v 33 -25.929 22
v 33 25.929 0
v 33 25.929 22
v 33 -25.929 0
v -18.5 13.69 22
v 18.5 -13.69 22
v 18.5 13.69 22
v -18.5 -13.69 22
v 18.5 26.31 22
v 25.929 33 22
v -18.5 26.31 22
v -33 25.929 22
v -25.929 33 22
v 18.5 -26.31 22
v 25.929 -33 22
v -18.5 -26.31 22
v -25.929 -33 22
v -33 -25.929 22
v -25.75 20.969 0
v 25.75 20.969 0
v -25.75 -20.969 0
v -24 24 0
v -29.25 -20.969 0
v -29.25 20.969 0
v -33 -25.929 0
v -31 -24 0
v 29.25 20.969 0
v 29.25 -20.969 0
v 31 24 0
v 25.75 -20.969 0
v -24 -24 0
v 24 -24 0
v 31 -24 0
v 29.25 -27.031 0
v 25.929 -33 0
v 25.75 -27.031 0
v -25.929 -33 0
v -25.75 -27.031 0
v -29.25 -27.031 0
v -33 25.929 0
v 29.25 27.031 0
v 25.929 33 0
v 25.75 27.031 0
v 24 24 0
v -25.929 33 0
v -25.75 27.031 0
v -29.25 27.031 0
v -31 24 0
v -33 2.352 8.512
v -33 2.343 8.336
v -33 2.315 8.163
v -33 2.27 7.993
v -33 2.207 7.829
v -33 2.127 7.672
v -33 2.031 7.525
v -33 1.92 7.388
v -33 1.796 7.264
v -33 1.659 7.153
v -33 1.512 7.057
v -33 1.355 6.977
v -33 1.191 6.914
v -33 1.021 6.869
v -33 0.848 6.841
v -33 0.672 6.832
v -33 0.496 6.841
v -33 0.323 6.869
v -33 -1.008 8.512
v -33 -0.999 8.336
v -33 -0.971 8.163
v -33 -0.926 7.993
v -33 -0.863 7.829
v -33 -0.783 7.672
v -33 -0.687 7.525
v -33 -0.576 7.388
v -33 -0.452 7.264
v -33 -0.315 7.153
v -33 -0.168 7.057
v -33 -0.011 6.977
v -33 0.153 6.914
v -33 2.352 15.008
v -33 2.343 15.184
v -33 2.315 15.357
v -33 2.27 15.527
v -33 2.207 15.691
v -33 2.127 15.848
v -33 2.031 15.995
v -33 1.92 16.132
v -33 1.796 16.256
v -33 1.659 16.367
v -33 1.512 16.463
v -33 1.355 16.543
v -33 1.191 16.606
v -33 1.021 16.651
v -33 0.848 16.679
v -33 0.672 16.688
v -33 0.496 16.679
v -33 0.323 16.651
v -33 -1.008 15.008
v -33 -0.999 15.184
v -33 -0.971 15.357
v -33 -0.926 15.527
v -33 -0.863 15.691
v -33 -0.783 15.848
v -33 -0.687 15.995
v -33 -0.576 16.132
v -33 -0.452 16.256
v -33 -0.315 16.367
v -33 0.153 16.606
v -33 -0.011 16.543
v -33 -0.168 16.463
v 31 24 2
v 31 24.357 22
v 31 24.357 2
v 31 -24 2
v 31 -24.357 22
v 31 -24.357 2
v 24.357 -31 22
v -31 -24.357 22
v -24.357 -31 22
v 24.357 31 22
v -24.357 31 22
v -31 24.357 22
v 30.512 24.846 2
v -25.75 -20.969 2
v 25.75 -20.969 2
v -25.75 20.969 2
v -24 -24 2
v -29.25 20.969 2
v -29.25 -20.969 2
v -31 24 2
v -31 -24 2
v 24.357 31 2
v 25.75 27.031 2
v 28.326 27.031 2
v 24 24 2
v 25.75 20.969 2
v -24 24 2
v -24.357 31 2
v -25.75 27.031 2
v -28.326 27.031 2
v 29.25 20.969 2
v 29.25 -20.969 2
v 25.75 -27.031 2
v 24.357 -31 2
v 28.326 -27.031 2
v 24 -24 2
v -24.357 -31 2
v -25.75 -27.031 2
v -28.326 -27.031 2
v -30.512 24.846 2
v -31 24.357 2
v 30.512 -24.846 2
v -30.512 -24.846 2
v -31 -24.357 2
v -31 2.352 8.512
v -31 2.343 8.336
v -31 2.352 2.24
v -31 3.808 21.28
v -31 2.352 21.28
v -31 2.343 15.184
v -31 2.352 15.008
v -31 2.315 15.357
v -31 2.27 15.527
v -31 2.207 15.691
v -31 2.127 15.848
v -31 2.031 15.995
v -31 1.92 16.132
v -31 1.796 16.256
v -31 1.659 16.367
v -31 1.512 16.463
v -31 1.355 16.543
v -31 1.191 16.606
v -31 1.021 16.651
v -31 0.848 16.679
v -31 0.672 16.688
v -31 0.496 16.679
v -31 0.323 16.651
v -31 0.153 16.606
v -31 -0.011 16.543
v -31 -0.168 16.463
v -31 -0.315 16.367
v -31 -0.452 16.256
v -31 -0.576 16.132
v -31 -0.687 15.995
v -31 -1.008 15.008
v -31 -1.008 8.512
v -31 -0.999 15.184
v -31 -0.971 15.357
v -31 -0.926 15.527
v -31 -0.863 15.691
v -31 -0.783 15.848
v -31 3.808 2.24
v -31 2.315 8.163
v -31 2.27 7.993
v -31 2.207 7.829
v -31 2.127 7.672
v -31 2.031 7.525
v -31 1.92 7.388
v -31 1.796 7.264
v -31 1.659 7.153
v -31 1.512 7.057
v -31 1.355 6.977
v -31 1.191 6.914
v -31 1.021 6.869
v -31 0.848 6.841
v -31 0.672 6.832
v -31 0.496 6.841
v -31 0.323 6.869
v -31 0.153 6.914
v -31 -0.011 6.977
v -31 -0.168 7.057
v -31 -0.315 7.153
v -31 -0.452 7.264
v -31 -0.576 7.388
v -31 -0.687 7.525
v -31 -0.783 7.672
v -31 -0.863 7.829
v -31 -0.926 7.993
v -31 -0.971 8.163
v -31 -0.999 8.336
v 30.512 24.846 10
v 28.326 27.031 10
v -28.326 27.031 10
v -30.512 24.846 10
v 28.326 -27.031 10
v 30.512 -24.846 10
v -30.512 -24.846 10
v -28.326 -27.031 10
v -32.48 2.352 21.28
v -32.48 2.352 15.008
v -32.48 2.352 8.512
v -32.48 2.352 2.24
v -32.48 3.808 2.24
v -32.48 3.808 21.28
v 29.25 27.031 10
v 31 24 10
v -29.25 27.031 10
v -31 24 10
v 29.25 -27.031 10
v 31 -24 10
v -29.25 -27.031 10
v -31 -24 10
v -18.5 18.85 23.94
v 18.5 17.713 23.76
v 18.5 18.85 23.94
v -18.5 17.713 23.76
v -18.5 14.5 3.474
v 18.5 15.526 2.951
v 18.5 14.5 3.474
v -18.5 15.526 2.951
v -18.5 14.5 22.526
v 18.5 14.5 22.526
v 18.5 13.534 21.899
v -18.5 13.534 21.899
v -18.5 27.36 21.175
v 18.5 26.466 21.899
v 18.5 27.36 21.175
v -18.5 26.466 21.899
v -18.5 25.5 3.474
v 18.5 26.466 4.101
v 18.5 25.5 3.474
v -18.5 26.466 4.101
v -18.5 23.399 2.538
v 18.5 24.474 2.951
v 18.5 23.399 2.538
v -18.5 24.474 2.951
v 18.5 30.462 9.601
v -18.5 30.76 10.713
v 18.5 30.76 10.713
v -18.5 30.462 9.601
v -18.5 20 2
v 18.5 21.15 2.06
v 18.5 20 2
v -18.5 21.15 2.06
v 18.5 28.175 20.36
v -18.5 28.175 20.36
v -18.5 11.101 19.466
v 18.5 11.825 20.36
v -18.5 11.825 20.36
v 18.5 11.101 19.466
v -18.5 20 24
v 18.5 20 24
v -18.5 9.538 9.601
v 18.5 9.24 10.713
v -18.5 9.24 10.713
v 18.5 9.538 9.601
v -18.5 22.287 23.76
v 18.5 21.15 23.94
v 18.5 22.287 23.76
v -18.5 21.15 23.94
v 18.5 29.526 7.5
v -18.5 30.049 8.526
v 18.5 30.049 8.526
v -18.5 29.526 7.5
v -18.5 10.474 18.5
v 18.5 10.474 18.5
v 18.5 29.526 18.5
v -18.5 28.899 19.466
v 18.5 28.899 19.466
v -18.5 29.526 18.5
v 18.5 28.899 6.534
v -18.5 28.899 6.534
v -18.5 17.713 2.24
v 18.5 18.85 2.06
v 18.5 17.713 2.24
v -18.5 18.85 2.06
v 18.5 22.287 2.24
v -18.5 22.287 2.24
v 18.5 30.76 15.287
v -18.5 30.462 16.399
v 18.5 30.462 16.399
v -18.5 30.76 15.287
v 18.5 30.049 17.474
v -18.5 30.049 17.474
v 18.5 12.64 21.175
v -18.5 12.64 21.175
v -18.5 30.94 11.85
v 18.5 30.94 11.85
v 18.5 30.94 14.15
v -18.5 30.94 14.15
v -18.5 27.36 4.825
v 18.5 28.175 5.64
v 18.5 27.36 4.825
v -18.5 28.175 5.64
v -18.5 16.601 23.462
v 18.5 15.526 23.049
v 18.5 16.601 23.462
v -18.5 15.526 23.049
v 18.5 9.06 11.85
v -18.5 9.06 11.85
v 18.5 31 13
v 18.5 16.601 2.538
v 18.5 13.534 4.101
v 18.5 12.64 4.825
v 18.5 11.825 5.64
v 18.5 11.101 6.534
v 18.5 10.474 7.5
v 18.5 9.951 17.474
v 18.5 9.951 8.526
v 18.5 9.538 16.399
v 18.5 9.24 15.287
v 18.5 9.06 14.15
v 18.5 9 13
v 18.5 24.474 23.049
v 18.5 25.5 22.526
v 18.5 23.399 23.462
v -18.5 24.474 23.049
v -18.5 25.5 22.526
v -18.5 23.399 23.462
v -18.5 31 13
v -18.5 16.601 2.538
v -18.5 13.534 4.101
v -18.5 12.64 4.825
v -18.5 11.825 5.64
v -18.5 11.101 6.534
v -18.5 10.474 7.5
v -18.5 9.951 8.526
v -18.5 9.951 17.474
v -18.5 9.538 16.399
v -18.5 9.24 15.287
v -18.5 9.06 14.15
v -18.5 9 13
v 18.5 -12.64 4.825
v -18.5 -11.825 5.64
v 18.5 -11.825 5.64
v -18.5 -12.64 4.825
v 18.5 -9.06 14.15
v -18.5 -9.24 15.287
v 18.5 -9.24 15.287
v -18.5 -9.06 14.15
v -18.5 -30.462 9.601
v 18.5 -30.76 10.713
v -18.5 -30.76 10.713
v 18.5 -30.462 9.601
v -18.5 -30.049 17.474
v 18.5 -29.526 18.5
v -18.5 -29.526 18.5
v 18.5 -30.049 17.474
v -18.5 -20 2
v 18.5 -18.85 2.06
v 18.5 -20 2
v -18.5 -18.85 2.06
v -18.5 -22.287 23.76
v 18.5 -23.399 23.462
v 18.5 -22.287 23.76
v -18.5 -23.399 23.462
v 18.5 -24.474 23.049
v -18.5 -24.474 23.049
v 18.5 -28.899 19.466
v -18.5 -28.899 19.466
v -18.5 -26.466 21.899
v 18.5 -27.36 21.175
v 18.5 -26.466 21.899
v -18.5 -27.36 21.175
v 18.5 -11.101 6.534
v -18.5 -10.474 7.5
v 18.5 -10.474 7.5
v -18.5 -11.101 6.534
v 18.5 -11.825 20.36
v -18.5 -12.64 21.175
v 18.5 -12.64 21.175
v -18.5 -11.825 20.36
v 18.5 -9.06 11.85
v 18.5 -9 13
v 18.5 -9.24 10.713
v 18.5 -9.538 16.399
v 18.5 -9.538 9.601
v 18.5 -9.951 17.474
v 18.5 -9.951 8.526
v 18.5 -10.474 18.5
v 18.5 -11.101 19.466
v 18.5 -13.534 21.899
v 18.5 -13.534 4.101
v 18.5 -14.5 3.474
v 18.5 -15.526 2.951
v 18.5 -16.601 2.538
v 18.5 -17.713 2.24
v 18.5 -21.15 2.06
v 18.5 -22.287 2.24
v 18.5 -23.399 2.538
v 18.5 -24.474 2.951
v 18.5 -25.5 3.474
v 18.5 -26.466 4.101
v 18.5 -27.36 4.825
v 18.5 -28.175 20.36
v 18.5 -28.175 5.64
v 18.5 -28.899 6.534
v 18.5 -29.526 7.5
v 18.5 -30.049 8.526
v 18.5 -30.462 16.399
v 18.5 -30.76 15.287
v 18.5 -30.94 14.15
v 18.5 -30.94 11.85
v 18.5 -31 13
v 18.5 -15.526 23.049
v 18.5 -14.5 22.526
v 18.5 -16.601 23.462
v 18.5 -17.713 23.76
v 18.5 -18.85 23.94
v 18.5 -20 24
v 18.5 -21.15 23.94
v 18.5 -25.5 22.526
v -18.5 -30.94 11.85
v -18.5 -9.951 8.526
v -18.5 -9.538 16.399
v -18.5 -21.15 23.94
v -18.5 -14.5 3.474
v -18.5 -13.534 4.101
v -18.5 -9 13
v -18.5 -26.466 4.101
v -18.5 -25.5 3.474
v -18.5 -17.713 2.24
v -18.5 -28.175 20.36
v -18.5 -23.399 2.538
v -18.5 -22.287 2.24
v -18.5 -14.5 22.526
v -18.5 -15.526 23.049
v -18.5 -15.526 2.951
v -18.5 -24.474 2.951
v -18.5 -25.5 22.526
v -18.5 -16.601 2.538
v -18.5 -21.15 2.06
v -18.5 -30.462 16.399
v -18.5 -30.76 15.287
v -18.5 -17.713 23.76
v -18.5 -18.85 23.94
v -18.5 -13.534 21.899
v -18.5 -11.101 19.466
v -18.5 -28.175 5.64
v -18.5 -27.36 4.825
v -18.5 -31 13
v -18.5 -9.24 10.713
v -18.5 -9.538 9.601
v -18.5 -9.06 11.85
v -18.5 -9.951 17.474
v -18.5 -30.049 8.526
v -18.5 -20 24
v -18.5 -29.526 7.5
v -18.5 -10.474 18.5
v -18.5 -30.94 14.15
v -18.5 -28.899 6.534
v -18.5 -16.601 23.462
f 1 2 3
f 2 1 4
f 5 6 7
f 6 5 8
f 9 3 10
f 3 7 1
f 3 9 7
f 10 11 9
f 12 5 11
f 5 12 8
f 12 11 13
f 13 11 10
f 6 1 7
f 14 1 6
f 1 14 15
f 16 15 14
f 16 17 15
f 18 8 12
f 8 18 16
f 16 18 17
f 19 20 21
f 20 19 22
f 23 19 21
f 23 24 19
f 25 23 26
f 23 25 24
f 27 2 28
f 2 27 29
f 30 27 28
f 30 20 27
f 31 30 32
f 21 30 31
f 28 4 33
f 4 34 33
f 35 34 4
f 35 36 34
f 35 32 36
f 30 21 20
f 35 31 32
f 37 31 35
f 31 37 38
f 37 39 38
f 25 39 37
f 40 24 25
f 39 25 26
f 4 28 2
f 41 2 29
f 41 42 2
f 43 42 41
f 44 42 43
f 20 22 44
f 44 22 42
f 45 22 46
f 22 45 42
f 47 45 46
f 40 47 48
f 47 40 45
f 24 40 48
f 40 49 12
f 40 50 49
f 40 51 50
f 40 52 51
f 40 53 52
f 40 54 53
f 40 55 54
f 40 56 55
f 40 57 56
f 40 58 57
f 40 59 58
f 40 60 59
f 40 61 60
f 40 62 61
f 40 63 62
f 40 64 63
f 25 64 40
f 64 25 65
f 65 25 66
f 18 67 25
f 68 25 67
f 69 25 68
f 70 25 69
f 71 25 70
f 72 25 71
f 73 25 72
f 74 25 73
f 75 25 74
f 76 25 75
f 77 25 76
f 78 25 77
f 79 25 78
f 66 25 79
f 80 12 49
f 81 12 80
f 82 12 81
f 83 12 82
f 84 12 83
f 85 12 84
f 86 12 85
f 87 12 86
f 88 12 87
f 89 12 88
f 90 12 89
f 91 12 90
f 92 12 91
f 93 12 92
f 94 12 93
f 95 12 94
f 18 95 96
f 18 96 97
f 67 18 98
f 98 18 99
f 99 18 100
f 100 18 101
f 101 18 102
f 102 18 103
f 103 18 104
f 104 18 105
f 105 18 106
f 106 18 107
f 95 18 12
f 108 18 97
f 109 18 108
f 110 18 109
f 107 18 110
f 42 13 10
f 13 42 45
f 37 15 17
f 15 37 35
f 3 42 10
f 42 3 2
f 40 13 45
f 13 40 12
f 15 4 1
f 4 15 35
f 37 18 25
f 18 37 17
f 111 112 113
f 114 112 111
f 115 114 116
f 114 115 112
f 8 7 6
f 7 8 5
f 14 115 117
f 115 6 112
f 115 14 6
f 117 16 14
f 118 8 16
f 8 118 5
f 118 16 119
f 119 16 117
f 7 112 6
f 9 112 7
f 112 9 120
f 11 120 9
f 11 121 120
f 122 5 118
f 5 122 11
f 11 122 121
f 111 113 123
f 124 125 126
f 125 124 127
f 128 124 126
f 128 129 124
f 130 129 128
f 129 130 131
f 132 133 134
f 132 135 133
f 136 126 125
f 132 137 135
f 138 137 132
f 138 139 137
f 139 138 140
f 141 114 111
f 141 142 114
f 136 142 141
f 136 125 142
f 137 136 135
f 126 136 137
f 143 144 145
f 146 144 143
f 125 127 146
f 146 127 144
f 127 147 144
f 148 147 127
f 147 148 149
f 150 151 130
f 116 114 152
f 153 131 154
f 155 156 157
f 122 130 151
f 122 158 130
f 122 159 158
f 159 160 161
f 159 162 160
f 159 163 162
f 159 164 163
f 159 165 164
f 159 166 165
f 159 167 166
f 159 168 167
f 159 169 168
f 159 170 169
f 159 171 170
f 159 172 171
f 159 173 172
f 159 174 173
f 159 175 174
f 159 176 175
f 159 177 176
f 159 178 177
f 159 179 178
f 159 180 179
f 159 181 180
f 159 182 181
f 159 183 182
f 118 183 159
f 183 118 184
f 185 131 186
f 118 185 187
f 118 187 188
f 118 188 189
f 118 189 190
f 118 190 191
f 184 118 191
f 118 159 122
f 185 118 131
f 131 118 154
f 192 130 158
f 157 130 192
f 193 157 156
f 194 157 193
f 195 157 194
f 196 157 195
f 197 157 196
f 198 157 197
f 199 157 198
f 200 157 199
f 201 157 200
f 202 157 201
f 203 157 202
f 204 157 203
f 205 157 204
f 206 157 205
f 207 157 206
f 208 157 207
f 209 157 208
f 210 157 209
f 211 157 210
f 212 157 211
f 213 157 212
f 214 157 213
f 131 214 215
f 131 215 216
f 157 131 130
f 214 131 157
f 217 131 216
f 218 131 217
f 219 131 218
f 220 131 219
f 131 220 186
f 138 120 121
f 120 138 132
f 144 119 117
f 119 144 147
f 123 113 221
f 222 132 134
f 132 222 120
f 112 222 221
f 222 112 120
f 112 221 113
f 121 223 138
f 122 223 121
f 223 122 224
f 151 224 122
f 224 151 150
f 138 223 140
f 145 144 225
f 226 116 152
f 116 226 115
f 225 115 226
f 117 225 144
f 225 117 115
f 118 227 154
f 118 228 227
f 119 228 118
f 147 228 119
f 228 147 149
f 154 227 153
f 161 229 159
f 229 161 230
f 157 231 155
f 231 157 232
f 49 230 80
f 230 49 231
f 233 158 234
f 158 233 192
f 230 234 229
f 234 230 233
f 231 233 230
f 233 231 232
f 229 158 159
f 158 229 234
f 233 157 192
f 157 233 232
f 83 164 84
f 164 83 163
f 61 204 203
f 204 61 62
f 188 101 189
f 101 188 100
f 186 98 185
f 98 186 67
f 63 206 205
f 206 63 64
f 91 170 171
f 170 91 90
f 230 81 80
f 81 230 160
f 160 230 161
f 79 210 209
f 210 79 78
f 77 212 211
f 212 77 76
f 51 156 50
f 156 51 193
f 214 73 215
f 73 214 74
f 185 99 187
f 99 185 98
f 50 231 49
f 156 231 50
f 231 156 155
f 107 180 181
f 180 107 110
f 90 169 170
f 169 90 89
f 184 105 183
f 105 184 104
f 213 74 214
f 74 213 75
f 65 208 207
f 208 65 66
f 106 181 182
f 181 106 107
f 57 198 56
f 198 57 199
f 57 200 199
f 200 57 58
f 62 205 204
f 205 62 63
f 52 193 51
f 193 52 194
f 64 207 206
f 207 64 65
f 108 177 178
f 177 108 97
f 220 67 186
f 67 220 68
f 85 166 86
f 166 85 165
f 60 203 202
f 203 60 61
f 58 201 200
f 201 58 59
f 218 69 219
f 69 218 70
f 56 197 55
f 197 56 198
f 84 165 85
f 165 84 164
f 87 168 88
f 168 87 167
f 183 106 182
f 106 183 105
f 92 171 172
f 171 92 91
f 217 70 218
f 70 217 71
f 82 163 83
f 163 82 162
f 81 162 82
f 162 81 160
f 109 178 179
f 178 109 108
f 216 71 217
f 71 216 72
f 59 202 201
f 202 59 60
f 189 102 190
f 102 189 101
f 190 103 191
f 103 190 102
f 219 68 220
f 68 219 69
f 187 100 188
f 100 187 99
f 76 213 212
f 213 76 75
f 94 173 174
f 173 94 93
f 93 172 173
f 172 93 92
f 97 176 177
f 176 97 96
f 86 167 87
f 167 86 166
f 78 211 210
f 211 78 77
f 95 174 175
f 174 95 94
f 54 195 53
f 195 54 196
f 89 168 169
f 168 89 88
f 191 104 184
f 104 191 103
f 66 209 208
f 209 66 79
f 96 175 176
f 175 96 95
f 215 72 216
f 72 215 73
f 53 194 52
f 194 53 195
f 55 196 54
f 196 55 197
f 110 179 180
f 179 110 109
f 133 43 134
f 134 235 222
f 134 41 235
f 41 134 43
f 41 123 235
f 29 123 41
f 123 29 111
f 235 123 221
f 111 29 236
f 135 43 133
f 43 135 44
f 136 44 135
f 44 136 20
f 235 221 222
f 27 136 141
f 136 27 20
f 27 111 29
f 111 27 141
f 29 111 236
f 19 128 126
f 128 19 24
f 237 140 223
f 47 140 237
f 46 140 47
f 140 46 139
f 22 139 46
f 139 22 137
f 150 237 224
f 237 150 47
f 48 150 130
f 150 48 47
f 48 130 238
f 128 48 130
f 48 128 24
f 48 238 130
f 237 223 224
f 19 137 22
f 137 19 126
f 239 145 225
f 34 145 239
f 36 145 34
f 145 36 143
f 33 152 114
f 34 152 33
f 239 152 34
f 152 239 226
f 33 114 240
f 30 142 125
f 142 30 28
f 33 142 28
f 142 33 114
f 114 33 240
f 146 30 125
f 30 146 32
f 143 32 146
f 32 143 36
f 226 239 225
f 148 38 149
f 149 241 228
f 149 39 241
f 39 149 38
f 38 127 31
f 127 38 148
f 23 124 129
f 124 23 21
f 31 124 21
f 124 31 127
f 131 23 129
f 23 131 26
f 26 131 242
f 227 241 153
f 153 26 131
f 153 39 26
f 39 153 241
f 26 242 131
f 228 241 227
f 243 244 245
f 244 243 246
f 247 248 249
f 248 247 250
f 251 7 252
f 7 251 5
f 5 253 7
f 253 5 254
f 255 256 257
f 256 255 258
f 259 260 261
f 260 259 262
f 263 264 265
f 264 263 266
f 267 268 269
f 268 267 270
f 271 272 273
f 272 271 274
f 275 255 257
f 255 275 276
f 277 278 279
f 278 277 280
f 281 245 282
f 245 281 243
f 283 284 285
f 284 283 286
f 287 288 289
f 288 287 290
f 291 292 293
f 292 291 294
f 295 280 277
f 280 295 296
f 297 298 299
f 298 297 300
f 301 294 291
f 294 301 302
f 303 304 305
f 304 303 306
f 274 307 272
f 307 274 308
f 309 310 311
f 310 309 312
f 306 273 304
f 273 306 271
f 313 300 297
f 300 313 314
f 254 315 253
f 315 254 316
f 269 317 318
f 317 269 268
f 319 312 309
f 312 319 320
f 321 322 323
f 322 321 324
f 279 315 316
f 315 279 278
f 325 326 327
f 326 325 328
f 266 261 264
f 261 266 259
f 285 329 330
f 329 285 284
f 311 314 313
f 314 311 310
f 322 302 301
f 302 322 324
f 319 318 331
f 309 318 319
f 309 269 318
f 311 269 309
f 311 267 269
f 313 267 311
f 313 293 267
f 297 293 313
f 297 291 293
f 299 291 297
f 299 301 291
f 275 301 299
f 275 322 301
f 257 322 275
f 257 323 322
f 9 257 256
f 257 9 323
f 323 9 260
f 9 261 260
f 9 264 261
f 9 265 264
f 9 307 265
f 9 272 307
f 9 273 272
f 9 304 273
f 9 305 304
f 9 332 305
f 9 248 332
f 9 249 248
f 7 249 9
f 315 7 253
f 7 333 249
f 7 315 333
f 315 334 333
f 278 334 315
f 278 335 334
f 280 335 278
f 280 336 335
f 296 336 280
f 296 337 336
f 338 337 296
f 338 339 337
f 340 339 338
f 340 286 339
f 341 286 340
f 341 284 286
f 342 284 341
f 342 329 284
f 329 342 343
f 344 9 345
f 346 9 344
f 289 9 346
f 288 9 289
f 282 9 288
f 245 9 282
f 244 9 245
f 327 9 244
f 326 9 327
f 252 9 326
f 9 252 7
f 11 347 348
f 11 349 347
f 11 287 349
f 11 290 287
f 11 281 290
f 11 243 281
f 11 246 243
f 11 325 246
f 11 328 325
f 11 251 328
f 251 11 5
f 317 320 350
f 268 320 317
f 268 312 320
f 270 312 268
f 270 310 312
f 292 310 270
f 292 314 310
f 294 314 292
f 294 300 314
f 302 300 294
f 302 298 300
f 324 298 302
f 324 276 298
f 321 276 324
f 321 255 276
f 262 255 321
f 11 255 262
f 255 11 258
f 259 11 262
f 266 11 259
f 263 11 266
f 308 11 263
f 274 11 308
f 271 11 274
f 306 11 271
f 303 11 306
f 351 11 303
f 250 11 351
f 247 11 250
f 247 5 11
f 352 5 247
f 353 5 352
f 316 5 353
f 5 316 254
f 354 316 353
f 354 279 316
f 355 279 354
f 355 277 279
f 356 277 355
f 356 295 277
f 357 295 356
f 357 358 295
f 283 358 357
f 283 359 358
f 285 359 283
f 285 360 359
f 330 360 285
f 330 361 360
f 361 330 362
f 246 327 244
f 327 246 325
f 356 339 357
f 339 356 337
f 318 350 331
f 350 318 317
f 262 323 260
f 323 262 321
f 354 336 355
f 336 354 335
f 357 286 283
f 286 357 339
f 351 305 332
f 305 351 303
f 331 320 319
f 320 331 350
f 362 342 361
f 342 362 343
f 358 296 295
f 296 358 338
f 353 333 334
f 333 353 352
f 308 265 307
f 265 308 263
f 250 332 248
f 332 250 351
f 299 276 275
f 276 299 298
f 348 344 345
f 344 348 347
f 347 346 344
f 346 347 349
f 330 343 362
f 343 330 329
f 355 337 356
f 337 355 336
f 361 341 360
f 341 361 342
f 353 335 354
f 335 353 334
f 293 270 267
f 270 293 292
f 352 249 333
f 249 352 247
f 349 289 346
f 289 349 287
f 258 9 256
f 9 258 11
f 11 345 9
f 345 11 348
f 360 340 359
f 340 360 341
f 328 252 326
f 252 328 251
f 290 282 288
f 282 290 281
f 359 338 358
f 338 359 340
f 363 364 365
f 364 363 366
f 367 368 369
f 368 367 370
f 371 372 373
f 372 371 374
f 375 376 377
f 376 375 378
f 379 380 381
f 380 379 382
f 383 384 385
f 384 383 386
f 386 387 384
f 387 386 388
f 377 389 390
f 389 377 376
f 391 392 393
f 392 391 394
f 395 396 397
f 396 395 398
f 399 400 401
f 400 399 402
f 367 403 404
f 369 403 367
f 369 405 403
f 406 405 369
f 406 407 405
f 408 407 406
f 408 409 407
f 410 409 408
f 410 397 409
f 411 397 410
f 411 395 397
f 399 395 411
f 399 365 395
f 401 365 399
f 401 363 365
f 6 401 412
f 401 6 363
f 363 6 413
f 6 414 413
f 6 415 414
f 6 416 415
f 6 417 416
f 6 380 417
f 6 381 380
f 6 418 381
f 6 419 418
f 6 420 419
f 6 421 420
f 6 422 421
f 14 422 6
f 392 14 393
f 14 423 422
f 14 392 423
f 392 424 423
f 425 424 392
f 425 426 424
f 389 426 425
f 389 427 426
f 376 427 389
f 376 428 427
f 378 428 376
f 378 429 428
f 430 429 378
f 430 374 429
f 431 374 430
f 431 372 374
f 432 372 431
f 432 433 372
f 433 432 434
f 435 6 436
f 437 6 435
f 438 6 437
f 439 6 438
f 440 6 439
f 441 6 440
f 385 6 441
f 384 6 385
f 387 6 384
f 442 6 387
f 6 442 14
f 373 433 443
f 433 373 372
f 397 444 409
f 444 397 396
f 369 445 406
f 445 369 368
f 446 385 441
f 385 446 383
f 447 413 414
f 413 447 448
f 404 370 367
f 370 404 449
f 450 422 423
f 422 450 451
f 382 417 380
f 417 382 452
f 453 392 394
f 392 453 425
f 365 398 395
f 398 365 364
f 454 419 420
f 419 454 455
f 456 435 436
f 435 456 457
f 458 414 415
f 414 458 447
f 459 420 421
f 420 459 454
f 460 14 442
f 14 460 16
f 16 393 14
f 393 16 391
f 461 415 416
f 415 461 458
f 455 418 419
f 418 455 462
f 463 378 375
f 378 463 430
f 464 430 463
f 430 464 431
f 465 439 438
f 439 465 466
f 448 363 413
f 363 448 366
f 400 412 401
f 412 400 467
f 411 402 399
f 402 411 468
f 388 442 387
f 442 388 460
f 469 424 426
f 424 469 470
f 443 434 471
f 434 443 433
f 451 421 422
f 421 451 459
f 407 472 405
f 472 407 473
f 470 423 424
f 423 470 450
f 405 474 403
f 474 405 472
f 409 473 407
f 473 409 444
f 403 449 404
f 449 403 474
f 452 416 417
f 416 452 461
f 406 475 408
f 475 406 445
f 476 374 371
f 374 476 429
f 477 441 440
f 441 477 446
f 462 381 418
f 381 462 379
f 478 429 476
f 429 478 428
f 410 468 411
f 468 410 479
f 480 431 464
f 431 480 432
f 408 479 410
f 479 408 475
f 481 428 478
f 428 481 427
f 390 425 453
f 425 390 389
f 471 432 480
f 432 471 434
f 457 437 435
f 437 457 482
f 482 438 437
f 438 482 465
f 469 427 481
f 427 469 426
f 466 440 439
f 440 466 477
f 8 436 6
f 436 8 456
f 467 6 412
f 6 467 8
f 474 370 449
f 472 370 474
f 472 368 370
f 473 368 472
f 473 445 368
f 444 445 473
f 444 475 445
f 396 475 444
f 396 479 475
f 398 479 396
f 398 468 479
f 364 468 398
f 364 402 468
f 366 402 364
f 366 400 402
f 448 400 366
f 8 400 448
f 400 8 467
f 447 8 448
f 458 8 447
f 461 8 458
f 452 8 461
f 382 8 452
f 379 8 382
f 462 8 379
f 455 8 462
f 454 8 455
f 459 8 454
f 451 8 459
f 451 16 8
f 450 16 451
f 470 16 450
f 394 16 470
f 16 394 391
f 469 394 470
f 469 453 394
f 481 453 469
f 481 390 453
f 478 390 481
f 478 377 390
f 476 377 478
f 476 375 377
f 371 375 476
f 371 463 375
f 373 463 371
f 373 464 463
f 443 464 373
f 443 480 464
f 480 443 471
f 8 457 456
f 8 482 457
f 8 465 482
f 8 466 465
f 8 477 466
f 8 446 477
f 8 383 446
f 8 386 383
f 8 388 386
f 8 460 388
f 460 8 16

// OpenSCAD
// file: ../../Household/references.scad
// Size
//Naming
// _PT = printable
// _ES = exact size
// _IS = insertable with force but no gaps

//--------------threaded rod  (TR)

//----M5

TR_M5_Diameter_ES = 5.8;
//for a hole 
TR_M5_Diamater_IS = 6;
TR_M5_Diamater_PT = 7;


//----M10

TR_M10_Diameter_ES = 9.6;
//for a hole 
TR_M10_Diamater_IS = 10;
TR_M10_Diamater_PT = 12;

//--------------Screw (SC)
//----M3

module body_M3(height_input){
    cylinder(d=SC_M3_Diameter_PT,h=height_input,$fn=60);
    
    }
    
SC_M3_Diameter_ES = 2.96;
SC_M3_Head_Diameter_ES = 5.90;
SC_M3_Head_Height_ES = 2.32;
//for a hole 
SC_M3_Diameter_PT = 4; 


//----M5

SC_M5_Diameter_ES = 4.86;
SC_M5_Head_Diameter_ES = 9.24;
SC_M5_Head_Height_ES = 3.0;
//for a hole 
SC_M5_Diamater_IS = 5;
SC_M5_Diamater_PT = 0; //inconnu pour le moment


//--------------Nut Bolt (NB)

module nut_M3(height_input){
    cylinder(d=NB_M3_Diameter_C2C_PT,h=height_input,$fn=6);
    
    }

//----M3
// Side to side = from 2 paralelle faces S2S
// corner to corner = from 2 corners C2C


NB_M3_Diameter_S2S_ES = 5.30;
NB_M3_Diameter_C2C_ES = 6.0;

NB_M3_Diameter_S2S_PT = 6.30; //reducing as well
NB_M3_Diameter_C2C_PT = 7.0; //8.0 was too much 


//--------------Zip ties (ZT)

//Big zip ties I got    

ZT_length_ES = 300;
ZT_width_ES = 4.8;
ZT_height_ES = 1;

ZT_width_PT = 7;
ZT_height_PT = 3;


//--------------Switch (SW)
//switch from castorama 
SW_length_ES = 13;
SW_width_ES = 8;
SW_height_ES = 14;

SW_length_PT = 15;
SW_width_PT = 10;
SW_height_PT = 16;


//switch from aliexpress
SW_AL_tube_width_ES = 5.7;
SW_AL_tube_width_PT = 7;

module custom_cylinder_switch(translated_position_X, translated_position_Y,translated_position_Z,heigh_input) {
    translate([translated_position_X, translated_position_Y, translated_position_Z]){ 
        rotate([90,0,0]){
            cylinder(d=SW_AL_tube_width_PT, h=heigh_input, $fn=30);
        }
    }
}

//--------------generic connectors (GC)
// USB C (USB-C)
GC_USB_C_length_ES = 7.3;
GC_USB_C_width_ES = 8.8;
GC_USB_C_height_ES = 3;

module USB_C(rotate_input,translate_input){
    translate(translate_input){
    rotate(rotate_input){
        hull(){
    cylinder(d=GC_USB_C_height_ES,h=GC_USB_C_length_ES,$fn=60);
translate([0,GC_USB_C_width_ES-GC_USB_C_height_ES,0]){
    cylinder(d=GC_USB_C_height_ES,h=GC_USB_C_length_ES,$fn=60);
}
}
    }
}
}

//--------------battery from vapes (BV)

//vapes crystal pro battery (CP)
BV_CP_length_ES = 34;
BV_CP_width_ES = 20;
BV_CP_height_ES = BV_CP_width_ES; //(because it's a cylinder)

BV_CP_length_PT = 37;
BV_CP_width_PT = 22;
BV_CP_height_PT = BV_CP_width_ES; //(because it's a cylinder)

//dimension list [legnth, width, height]
//BV_CP_PT=[37,22,22];
BV_CP_PT=[BV_CP_length_PT,BV_CP_width_PT,BV_CP_height_PT];

module vapes_battery(input_list,rotate_input,translate_input){
translate(translate_input){
    rotate(rotate_input){
        color("green")cylinder(d=input_list[1],h=input_list[0],$fn=60);
    }
    }
}


//--------------battery charger (BC)
//Board Charger TP4056 Module  (TP)

//https://www.az-delivery.uk/cdn/shop/products/tp4056-batterieladungsmodul-usb-typ-c-schutzschaltung-led-anzeigen-fur-ihre-li-ion-oder-lipo-einzelzellenbatterien-126337.jpg?v=1694708173


BC_TP_length_ES = 28;
BC_TP_full_length_ES = 28; //usb C end included
BC_TP_width_ES = 17;
BC_TP_height_ES = 1.3; //without USB C
BC_TP_full_height_ES = 5; //with USB C



//usb C connector position
BC_TP_width_from_side_ES = 8.44;//center of USB C connector from bottom (view from the top )
BC_TP_height_from_bottom_ES = 3.4;//center of USB C connector from bottom (view from the top )
BC_TP_negative_length_ES = 2;//center of USB C connector from bottom 

module battery_charger(rotate_input,translate_input){
    translate(translate_input){
    rotate(rotate_input){
        color("green"){
            cube([BC_TP_full_length_ES,BC_TP_width_ES,BC_TP_height_ES]);

                rotate_array_USB_C=[0,90,0];
    translate_array_USB_C=[-BC_TP_negative_length_ES,BC_TP_width_ES/2-(GC_USB_C_width_ES-GC_USB_C_height_ES)/2,GC_USB_C_height_ES/2+BC_TP_height_ES];
    
    USB_C(rotate_array_USB_C,translate_array_USB_C);

            
            }
    }
}
    
    }


//https://www.alectrofag.co.uk/cdn/shop/files/Hayati_Pro_Max_4000_Puffs_Disposable_Vape.jpg?v=1725012272




//https://d138zd1ktt9iqe.cloudfront.net/media/seo_landing_files/length-width-height-01-1646654708.png
// main file
//measurements
include <../../Household/references.scad>

//https://www.lofty.com/pages/how-to-measure-three-dimensional-objects-including-silver-ceramics-glass-sculpture


wall_thickness = 2;

//battery holder dimension

battery_pack_length = BV_CP_length_PT;
battery_pack_width = BV_CP_width_PT*2;
battery_pack_height = BV_CP_height_PT;

//main body (looking from top)

main_body_height = battery_pack_height + wall_thickness;//+ others elements after 
main_body_width = 1.5*battery_pack_width;
main_body_length = main_body_width;

//square_base

//main_body_length = main_body_width;
//main_body_width = main_body_width;
//main_body_height = battery_pack_height; 
 

//square_base_inside

square_base_inside_length = main_body_length-(wall_thickness*2);
square_base_inside_width = main_body_width-(wall_thickness*2);
square_base_inside_height = main_body_height-(wall_thickness);


module battery_display(){
    rotate_array=[0,90,0];
    translate_array=[-(battery_pack_length/2),(main_body_width/2)-(BV_CP_width_PT/2)-wall_thickness,(BV_CP_width_PT/2)+wall_thickness];
    translate_array2=[-(battery_pack_length/2),-(main_body_width/2)+(BV_CP_width_PT/2)+wall_thickness,(BV_CP_width_PT/2)+wall_thickness];
    
    vapes_battery(BV_CP_PT,rotate_array,translate_array);
    vapes_battery(BV_CP_PT,rotate_array,translate_array2);

    }

module corner_cut(translate_x,translate_y,translate_z){
    translate([translate_x,translate_y,translate_z]){
        color("green"){
            rotate([0,0,45]){
                translate([-5,-5,0]){
                    cube([10,10,main_body_height]);
                }
            }
            }
        }
    }
    

module square_base(){
    difference(){
         translate([-main_body_length/2,-main_body_width/2,0]){
            
                cube([main_body_length, main_body_width, main_body_height]);
                
        }
    corner_cut(main_body_length/2,main_body_length/2,0);
    corner_cut(-main_body_length/2,main_body_length/2,0);
    corner_cut(main_body_length/2,-main_body_length/2,0);
    corner_cut(-main_body_length/2,-main_body_length/2,0);
    }

    
}





module main_object(){
    difference(){
        square_base();
        translate([0,0,wall_thickness]){
            color("blue"){    resize([square_base_inside_length,square_base_inside_width,square_base_inside_height]){square_base();}}
            
                

        }
  
    
        translate([square_base_inside_width/2-(NB_M3_Diameter_C2C_PT/2),square_base_inside_length/2-(NB_M3_Diameter_C2C_PT),0]){
        nut_M3(10);
        }
    translate([-((square_base_inside_width/2)-(NB_M3_Diameter_C2C_PT/2)),square_base_inside_length/2-(NB_M3_Diameter_C2C_PT),0]){
        nut_M3(10);
        }
    translate([square_base_inside_width/2-(NB_M3_Diameter_C2C_PT/2),-(square_base_inside_length/2-(NB_M3_Diameter_C2C_PT)),0]){
        nut_M3(10);
        }
    translate([-(square_base_inside_width/2-(NB_M3_Diameter_C2C_PT/2)),-(square_base_inside_length/2-(NB_M3_Diameter_C2C_PT)),0]){
        nut_M3(10);
        }
    
            rotate_array_battery_charger=[90,0,0];
    translate_array_battery_charger=[-(main_body_width/2)+4,BC_TP_height_from_bottom_ES,2];
    scale([1.12,1.12,1.12]){
    battery_charger(rotate_array_battery_charger,translate_array_battery_charger);
    }
    
        
        
    }
    
}


module battery_holder(translate_x,translate_y,translate_z){
    translate([translate_x,translate_y,translate_z]){
        import("1_Battery_individual.stl");
    }
}
module square_inside_magnet(){
    translate([-hole_inside_magnet_height/2,-hole_inside_magnet_width/2,main_body_height]){
        color("green"){cube([hole_inside_magnet_height,hole_inside_magnet_width,hole_inside_magnet_depth]);}
    }
    }
    
//holes if you want to make an open wall
module hexagon_Y(y_input,z_input){
    for (i = [-main_body_width/2:12: main_body_width/2]){
        translate([i,y_input,z_input]){
            rotate([90,0,0]){
                color("purple"){cylinder(r=5,h=square_base_wall_thickness,$fn=6);}
            }
        }
    }
}

module main_body(){
        main_object();
    
battery_display();


}



main_body();
